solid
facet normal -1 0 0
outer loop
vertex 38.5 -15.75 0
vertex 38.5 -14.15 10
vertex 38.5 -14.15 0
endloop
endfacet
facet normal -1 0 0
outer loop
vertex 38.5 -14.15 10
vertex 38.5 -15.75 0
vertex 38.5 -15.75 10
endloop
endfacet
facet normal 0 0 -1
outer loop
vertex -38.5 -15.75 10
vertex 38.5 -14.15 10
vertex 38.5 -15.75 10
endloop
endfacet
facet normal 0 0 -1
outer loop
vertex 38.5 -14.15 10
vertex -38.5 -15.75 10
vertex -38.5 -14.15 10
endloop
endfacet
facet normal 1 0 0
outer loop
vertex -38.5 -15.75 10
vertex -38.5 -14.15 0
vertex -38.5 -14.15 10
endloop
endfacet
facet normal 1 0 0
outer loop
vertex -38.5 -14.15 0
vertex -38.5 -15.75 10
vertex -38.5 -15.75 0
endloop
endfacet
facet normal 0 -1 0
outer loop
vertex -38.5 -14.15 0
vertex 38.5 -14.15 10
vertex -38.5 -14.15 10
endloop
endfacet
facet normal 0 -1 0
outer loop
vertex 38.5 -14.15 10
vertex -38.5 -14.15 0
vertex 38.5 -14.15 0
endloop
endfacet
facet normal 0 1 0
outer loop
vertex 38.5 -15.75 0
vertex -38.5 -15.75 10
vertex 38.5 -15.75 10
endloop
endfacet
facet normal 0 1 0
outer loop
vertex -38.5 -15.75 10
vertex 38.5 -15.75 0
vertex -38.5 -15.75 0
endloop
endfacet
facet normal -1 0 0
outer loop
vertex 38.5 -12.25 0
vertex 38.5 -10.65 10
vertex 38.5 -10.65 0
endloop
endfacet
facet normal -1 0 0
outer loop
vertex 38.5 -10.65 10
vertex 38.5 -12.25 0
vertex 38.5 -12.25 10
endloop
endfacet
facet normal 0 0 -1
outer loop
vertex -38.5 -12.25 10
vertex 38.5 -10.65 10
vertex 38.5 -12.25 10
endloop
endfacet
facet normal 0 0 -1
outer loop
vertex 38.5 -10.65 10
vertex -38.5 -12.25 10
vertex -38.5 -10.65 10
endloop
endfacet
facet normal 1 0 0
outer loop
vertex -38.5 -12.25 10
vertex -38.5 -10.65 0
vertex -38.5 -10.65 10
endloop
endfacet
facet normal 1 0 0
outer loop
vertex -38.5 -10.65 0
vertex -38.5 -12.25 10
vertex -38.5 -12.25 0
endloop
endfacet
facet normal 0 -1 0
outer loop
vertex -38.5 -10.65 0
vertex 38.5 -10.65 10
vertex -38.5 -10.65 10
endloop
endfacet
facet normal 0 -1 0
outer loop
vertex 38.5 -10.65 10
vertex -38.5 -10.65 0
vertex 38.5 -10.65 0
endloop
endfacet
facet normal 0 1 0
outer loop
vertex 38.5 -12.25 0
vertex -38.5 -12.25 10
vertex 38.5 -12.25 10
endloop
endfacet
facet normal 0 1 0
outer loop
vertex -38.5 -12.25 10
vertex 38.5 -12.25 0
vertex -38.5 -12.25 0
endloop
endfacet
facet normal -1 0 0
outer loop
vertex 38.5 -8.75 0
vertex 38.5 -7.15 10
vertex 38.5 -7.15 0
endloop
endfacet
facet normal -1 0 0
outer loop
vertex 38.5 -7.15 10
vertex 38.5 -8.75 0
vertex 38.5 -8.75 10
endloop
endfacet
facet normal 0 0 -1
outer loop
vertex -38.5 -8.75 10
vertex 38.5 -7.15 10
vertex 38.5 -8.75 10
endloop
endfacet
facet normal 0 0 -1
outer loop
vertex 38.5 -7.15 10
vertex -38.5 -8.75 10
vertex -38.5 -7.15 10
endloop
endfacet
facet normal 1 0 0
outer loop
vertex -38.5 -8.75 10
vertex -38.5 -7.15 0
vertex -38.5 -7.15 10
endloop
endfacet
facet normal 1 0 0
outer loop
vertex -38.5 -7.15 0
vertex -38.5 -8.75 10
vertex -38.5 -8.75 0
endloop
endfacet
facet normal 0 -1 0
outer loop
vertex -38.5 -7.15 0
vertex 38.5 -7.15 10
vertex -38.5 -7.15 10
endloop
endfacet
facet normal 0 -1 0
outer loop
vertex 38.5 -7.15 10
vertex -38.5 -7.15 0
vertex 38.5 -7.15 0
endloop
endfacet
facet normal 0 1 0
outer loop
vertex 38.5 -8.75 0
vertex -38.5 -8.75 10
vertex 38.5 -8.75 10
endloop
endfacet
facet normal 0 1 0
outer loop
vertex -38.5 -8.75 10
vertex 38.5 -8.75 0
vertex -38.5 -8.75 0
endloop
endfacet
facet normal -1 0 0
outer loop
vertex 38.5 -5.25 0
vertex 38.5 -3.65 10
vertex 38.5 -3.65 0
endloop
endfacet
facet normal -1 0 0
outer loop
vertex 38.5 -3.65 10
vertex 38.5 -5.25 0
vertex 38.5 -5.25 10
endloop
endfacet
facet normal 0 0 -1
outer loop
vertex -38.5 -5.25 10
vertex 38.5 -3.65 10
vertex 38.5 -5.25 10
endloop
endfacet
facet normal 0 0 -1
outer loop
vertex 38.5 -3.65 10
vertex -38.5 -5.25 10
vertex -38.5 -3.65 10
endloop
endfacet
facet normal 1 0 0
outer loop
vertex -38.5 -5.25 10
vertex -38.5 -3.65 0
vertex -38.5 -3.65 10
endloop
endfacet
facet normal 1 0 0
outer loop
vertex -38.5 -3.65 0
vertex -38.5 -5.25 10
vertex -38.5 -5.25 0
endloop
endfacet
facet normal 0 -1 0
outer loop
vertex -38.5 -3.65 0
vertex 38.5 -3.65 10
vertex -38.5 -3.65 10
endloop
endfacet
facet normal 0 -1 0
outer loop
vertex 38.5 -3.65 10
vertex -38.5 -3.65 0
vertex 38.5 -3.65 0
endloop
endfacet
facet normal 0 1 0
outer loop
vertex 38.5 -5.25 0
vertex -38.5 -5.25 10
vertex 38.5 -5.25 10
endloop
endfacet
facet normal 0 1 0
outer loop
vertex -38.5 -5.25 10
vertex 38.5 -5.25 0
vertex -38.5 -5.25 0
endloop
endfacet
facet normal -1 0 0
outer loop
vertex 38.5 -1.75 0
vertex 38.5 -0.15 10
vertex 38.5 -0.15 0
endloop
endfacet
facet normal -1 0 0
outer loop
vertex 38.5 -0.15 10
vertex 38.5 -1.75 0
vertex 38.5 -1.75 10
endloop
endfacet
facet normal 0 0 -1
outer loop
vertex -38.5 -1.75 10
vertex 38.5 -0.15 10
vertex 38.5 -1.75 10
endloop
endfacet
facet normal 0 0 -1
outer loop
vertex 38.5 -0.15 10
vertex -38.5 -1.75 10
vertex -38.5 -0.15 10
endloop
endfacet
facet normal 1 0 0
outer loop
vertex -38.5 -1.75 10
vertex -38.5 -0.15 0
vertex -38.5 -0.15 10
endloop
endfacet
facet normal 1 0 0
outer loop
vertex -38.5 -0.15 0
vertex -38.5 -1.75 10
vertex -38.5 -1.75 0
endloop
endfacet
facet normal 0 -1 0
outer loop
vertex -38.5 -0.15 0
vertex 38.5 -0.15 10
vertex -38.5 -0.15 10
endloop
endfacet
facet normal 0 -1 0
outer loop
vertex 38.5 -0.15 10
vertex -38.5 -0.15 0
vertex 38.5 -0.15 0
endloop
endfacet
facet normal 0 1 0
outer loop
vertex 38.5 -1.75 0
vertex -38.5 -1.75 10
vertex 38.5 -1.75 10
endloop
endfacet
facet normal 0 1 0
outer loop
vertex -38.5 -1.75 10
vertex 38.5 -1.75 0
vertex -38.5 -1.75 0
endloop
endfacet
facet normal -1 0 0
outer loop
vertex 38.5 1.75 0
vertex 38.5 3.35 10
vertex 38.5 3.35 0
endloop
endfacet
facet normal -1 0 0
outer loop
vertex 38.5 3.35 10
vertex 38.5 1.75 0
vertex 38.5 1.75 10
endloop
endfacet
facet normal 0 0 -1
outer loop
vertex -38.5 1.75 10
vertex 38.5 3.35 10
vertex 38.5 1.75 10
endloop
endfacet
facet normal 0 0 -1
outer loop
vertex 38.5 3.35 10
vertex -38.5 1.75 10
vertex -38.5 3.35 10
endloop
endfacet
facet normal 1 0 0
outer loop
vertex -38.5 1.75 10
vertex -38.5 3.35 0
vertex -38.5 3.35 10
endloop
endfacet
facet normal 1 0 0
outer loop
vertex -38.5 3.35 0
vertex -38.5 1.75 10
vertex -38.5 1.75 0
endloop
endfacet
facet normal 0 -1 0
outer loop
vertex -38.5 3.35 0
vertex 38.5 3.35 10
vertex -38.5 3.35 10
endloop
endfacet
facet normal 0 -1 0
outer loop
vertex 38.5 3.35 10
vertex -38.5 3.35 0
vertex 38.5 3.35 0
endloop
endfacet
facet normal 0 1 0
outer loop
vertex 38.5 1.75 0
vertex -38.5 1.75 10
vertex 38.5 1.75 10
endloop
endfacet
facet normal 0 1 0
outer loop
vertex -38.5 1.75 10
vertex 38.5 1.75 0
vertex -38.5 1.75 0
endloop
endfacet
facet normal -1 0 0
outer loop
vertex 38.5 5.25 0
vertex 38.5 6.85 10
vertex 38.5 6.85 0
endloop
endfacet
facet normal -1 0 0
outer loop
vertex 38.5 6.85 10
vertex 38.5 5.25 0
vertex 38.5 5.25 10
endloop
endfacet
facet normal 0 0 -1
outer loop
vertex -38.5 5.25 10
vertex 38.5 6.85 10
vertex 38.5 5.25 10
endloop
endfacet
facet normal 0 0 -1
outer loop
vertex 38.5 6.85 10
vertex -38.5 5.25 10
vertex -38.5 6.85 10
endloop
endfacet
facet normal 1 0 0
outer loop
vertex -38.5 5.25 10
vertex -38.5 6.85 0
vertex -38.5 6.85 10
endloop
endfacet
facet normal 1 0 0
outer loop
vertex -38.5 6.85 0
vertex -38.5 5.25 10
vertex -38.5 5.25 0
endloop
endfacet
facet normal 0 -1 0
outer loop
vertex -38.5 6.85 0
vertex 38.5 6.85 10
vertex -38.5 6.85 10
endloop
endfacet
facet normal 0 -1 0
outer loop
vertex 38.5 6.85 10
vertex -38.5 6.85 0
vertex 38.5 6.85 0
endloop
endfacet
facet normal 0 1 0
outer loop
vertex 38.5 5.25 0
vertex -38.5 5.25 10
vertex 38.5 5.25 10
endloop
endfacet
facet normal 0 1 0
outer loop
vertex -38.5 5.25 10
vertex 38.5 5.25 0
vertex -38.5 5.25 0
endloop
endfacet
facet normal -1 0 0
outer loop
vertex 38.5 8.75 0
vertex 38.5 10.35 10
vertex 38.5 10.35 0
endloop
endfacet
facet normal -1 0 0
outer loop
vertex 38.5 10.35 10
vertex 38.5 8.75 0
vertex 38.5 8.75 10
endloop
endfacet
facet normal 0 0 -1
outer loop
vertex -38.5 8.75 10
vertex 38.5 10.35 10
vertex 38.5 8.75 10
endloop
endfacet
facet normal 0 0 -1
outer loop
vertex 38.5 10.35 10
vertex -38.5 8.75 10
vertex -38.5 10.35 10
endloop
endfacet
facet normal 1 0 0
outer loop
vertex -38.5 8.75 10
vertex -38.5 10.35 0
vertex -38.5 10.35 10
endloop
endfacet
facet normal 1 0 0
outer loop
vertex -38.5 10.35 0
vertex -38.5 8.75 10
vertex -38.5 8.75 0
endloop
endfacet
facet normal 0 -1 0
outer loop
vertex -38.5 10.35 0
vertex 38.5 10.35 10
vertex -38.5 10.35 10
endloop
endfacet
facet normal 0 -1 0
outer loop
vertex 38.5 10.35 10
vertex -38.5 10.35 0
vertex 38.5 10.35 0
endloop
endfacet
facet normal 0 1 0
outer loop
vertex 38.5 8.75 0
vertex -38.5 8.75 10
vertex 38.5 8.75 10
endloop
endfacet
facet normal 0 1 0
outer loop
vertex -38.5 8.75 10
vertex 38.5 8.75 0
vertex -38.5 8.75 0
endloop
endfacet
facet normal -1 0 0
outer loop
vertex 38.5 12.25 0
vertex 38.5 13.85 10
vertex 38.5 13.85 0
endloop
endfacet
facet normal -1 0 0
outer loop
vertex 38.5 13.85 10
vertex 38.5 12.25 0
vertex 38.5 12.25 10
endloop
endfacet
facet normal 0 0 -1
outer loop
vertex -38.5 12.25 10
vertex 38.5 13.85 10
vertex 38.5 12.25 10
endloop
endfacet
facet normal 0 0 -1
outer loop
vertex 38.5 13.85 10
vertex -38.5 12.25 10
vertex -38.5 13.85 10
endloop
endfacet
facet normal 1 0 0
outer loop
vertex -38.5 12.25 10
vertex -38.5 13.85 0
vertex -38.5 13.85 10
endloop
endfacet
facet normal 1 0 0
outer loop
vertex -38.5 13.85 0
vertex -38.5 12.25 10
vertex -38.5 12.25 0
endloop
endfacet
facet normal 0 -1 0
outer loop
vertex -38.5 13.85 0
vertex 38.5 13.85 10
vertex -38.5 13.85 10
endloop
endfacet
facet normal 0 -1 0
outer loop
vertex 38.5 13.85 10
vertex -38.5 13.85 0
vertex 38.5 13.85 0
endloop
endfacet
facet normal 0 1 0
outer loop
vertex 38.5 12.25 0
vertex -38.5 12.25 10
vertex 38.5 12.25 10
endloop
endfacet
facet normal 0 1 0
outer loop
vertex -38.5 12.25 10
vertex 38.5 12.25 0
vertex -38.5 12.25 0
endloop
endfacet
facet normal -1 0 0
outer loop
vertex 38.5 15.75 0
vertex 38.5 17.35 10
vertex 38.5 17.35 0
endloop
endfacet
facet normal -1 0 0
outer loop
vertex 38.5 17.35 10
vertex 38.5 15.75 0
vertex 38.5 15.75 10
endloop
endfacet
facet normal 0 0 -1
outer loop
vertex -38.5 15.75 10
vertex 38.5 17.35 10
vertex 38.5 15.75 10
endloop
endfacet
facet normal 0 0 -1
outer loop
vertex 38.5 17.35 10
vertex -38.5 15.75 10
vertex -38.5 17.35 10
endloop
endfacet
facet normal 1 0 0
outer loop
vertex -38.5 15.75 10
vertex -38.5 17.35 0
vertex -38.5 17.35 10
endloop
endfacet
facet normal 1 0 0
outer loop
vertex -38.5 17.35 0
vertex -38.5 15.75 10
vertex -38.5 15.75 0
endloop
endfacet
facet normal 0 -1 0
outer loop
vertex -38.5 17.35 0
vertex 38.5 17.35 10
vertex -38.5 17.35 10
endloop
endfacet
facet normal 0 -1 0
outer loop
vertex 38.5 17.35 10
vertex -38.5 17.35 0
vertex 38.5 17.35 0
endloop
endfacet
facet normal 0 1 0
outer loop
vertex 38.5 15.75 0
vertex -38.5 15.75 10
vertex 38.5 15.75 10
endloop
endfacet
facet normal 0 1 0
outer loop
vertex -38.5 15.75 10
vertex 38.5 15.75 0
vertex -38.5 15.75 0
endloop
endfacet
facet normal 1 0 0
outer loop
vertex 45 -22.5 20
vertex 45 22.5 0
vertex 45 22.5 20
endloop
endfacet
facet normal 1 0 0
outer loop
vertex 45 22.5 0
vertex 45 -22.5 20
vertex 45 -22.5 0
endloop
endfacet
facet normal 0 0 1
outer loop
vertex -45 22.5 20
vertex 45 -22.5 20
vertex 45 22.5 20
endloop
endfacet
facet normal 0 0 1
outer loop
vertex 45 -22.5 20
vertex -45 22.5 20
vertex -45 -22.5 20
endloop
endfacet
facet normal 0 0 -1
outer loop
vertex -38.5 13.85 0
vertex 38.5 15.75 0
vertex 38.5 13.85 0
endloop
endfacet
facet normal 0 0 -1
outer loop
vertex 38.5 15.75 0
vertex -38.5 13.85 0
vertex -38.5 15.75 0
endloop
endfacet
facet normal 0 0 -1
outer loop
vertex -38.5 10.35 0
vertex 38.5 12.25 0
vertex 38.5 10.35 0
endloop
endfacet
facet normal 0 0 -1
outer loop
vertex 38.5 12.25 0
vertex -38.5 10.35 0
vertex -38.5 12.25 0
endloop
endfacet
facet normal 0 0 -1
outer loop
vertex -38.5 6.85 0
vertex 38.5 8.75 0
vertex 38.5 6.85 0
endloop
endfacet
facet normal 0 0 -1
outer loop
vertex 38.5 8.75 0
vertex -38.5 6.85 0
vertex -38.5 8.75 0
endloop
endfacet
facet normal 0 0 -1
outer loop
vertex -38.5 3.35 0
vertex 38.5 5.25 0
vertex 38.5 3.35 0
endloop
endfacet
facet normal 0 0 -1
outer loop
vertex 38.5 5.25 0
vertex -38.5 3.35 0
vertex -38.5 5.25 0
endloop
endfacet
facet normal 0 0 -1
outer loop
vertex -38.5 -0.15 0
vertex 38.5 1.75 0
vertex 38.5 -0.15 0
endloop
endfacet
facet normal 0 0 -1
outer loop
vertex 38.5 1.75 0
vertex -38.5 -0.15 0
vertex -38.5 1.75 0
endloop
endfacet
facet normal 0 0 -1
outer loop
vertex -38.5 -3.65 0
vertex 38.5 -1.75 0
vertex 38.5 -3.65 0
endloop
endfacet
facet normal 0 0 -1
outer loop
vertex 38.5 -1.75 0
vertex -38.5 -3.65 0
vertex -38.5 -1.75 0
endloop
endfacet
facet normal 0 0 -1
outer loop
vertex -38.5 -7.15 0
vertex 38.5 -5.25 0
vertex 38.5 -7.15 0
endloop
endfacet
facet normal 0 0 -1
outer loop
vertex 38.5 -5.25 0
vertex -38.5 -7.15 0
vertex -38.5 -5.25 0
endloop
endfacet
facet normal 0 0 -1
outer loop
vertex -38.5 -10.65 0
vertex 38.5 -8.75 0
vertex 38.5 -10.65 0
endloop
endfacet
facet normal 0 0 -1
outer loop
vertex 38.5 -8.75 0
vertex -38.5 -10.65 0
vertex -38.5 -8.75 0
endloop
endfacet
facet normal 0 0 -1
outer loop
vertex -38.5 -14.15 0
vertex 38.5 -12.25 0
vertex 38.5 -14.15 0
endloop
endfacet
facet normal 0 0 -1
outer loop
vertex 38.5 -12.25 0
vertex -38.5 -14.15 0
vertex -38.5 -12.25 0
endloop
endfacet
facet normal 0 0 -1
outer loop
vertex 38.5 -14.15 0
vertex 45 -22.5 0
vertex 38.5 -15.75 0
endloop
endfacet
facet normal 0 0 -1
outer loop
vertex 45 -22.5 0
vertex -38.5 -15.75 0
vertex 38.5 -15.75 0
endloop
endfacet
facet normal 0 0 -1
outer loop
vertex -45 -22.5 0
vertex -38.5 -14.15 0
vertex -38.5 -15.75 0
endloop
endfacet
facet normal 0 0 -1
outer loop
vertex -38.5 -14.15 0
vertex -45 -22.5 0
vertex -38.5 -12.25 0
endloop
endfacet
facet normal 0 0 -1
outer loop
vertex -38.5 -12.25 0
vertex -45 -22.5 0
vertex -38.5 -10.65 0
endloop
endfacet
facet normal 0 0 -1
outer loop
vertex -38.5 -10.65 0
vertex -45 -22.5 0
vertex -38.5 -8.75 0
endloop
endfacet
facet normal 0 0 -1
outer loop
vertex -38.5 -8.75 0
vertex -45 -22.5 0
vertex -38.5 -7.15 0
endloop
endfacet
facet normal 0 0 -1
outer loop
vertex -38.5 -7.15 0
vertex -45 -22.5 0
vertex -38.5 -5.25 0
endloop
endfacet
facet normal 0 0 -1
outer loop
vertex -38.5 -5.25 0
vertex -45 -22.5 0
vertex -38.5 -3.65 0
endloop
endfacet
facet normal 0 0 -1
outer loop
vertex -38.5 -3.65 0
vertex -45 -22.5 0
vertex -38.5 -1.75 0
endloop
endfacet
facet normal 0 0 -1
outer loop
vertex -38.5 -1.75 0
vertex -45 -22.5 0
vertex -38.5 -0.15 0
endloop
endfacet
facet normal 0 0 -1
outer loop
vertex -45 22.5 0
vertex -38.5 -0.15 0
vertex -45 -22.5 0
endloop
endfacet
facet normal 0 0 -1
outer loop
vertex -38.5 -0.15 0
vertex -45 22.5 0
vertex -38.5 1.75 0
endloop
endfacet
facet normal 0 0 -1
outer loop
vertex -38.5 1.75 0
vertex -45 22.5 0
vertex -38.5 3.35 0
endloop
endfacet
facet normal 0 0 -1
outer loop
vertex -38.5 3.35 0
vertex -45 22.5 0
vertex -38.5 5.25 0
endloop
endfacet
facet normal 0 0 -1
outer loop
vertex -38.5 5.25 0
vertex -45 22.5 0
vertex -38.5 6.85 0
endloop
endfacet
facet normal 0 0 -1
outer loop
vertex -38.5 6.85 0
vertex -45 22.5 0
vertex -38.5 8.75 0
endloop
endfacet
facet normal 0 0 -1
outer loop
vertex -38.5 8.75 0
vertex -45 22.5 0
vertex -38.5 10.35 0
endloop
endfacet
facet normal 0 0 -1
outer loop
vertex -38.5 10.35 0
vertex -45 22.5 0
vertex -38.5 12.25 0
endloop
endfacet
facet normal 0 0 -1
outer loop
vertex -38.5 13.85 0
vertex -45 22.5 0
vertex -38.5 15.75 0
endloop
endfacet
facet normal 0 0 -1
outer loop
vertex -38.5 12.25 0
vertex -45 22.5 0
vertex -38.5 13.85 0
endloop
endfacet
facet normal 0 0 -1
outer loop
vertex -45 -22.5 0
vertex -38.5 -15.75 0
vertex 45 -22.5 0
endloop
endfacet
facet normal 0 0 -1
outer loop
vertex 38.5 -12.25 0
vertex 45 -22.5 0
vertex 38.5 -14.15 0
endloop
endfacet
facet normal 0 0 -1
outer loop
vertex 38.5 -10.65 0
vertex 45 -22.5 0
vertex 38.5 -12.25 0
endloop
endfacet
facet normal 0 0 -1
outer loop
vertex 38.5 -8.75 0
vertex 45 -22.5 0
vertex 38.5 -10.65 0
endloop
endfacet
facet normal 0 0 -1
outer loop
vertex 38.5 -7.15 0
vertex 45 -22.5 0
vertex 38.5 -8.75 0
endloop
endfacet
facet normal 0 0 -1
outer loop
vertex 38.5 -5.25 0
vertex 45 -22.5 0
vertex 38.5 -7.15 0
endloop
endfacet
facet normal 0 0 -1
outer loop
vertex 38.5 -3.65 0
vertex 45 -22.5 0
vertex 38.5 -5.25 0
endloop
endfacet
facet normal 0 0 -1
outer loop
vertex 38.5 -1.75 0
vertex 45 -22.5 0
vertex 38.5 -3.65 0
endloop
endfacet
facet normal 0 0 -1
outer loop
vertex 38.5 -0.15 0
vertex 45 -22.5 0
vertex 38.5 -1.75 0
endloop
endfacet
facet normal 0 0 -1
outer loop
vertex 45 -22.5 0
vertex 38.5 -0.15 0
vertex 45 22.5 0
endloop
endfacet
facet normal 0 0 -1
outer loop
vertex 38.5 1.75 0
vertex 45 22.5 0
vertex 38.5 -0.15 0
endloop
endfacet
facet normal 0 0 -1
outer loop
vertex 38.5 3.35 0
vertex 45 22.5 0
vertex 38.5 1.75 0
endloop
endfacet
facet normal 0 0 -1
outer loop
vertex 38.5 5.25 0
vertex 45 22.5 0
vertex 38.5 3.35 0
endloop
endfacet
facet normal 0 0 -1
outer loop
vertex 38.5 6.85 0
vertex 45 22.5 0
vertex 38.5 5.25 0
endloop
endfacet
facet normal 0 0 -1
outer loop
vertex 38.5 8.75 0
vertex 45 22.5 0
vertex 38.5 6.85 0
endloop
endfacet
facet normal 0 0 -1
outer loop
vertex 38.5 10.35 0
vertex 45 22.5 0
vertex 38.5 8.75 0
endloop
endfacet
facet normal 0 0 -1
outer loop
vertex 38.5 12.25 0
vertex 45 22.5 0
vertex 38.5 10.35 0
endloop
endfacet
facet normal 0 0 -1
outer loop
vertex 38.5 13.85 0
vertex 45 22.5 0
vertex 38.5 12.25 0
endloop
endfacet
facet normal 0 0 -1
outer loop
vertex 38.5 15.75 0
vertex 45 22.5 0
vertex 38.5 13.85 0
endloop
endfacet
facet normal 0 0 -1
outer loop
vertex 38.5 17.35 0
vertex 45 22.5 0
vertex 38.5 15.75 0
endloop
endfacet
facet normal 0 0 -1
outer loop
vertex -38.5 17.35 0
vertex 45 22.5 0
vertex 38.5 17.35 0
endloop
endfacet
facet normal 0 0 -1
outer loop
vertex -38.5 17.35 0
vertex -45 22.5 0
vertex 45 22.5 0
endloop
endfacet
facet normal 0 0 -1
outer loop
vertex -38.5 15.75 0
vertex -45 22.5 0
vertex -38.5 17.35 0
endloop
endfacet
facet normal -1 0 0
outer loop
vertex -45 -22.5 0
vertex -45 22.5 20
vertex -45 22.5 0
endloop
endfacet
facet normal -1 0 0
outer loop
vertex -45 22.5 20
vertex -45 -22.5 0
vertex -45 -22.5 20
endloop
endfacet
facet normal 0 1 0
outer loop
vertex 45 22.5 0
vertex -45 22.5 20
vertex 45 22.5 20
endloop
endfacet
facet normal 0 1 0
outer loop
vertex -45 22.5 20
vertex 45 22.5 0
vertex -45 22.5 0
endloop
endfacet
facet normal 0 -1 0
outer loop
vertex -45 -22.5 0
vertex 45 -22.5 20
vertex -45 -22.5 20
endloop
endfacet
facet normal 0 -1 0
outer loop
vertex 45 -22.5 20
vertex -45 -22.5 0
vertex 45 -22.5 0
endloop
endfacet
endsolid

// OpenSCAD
// Microscope slide drying rack - solid base with 10 parallel slots for standing slides.

// Base dimensions
L_base = 90;
W_base = 45;
H_base = 20;

// Slide dimensions (standard 75x25x1 mm)
slide_len = 75;
slide_w   = 25;
slide_thk = 1;

// Slot dimensions
slot_len = 77;
slot_w   = 1.6;
slot_deep = 10;

// Spacing and positioning
slot_spacing = 3.5;
num_slots = 10;

$fn = 64;

// Calculate Y position of the first slot centre
// Slots are centred on the block in Y.
// Total span of slots = (num_slots - 1) * slot_spacing
// Distance from block centre to first slot = (Total span / 2) + (slot_spacing / 2)
// Actually, simpler: positions are symmetric around 0.
// i=0 is at -offset, i=num_slots-1 is at +offset.
// offset = ( (num_slots - 1) * slot_spacing ) / 2
y_offset = ( (num_slots - 1) * slot_spacing ) / 2;

difference() {
    // 1. The solid base block
    // Centre it in X and Y, sit it on Z=0
    translate([-L_base / 2, -W_base / 2, 0]) 
        cube([L_base, W_base, H_base]);

    // 2. Cut the 10 slots
    // Slots run along X, so they are long in X and narrow in Y.
    // They are cut into the top face, so they go down from Z = H_base.
    for (i = [0 : num_slots - 1]) {
        // Calculate Y position for this slot
        y_pos = (i - (num_slots - 1) / 2) * slot_spacing;
        
        // Slot geometry:
        // Length along X: slot_len
        // Width along Y: slot_w
        // Depth along Z: slot_deep
        
        // To cut a slot, we extrude a rectangle along Z downwards.
        // The slot is open at the top, so we cut from the top surface down.
        // We extend slightly past the bottom to ensure clean cut.
        
        translate([
            -slot_len / 2,          // Centre in X
            y_pos,                  // Position in Y
            H_base - slot_deep      // Start at top of slot depth
        ]) {
            // Extrude a rectangle downwards (negative Z)
            // We use a small negative height to cut through the base
            translate([0, 0, -slot_deep - 0.1]) 
                cube([slot_len, slot_w, slot_deep + 0.1]);
        }
    }
}
